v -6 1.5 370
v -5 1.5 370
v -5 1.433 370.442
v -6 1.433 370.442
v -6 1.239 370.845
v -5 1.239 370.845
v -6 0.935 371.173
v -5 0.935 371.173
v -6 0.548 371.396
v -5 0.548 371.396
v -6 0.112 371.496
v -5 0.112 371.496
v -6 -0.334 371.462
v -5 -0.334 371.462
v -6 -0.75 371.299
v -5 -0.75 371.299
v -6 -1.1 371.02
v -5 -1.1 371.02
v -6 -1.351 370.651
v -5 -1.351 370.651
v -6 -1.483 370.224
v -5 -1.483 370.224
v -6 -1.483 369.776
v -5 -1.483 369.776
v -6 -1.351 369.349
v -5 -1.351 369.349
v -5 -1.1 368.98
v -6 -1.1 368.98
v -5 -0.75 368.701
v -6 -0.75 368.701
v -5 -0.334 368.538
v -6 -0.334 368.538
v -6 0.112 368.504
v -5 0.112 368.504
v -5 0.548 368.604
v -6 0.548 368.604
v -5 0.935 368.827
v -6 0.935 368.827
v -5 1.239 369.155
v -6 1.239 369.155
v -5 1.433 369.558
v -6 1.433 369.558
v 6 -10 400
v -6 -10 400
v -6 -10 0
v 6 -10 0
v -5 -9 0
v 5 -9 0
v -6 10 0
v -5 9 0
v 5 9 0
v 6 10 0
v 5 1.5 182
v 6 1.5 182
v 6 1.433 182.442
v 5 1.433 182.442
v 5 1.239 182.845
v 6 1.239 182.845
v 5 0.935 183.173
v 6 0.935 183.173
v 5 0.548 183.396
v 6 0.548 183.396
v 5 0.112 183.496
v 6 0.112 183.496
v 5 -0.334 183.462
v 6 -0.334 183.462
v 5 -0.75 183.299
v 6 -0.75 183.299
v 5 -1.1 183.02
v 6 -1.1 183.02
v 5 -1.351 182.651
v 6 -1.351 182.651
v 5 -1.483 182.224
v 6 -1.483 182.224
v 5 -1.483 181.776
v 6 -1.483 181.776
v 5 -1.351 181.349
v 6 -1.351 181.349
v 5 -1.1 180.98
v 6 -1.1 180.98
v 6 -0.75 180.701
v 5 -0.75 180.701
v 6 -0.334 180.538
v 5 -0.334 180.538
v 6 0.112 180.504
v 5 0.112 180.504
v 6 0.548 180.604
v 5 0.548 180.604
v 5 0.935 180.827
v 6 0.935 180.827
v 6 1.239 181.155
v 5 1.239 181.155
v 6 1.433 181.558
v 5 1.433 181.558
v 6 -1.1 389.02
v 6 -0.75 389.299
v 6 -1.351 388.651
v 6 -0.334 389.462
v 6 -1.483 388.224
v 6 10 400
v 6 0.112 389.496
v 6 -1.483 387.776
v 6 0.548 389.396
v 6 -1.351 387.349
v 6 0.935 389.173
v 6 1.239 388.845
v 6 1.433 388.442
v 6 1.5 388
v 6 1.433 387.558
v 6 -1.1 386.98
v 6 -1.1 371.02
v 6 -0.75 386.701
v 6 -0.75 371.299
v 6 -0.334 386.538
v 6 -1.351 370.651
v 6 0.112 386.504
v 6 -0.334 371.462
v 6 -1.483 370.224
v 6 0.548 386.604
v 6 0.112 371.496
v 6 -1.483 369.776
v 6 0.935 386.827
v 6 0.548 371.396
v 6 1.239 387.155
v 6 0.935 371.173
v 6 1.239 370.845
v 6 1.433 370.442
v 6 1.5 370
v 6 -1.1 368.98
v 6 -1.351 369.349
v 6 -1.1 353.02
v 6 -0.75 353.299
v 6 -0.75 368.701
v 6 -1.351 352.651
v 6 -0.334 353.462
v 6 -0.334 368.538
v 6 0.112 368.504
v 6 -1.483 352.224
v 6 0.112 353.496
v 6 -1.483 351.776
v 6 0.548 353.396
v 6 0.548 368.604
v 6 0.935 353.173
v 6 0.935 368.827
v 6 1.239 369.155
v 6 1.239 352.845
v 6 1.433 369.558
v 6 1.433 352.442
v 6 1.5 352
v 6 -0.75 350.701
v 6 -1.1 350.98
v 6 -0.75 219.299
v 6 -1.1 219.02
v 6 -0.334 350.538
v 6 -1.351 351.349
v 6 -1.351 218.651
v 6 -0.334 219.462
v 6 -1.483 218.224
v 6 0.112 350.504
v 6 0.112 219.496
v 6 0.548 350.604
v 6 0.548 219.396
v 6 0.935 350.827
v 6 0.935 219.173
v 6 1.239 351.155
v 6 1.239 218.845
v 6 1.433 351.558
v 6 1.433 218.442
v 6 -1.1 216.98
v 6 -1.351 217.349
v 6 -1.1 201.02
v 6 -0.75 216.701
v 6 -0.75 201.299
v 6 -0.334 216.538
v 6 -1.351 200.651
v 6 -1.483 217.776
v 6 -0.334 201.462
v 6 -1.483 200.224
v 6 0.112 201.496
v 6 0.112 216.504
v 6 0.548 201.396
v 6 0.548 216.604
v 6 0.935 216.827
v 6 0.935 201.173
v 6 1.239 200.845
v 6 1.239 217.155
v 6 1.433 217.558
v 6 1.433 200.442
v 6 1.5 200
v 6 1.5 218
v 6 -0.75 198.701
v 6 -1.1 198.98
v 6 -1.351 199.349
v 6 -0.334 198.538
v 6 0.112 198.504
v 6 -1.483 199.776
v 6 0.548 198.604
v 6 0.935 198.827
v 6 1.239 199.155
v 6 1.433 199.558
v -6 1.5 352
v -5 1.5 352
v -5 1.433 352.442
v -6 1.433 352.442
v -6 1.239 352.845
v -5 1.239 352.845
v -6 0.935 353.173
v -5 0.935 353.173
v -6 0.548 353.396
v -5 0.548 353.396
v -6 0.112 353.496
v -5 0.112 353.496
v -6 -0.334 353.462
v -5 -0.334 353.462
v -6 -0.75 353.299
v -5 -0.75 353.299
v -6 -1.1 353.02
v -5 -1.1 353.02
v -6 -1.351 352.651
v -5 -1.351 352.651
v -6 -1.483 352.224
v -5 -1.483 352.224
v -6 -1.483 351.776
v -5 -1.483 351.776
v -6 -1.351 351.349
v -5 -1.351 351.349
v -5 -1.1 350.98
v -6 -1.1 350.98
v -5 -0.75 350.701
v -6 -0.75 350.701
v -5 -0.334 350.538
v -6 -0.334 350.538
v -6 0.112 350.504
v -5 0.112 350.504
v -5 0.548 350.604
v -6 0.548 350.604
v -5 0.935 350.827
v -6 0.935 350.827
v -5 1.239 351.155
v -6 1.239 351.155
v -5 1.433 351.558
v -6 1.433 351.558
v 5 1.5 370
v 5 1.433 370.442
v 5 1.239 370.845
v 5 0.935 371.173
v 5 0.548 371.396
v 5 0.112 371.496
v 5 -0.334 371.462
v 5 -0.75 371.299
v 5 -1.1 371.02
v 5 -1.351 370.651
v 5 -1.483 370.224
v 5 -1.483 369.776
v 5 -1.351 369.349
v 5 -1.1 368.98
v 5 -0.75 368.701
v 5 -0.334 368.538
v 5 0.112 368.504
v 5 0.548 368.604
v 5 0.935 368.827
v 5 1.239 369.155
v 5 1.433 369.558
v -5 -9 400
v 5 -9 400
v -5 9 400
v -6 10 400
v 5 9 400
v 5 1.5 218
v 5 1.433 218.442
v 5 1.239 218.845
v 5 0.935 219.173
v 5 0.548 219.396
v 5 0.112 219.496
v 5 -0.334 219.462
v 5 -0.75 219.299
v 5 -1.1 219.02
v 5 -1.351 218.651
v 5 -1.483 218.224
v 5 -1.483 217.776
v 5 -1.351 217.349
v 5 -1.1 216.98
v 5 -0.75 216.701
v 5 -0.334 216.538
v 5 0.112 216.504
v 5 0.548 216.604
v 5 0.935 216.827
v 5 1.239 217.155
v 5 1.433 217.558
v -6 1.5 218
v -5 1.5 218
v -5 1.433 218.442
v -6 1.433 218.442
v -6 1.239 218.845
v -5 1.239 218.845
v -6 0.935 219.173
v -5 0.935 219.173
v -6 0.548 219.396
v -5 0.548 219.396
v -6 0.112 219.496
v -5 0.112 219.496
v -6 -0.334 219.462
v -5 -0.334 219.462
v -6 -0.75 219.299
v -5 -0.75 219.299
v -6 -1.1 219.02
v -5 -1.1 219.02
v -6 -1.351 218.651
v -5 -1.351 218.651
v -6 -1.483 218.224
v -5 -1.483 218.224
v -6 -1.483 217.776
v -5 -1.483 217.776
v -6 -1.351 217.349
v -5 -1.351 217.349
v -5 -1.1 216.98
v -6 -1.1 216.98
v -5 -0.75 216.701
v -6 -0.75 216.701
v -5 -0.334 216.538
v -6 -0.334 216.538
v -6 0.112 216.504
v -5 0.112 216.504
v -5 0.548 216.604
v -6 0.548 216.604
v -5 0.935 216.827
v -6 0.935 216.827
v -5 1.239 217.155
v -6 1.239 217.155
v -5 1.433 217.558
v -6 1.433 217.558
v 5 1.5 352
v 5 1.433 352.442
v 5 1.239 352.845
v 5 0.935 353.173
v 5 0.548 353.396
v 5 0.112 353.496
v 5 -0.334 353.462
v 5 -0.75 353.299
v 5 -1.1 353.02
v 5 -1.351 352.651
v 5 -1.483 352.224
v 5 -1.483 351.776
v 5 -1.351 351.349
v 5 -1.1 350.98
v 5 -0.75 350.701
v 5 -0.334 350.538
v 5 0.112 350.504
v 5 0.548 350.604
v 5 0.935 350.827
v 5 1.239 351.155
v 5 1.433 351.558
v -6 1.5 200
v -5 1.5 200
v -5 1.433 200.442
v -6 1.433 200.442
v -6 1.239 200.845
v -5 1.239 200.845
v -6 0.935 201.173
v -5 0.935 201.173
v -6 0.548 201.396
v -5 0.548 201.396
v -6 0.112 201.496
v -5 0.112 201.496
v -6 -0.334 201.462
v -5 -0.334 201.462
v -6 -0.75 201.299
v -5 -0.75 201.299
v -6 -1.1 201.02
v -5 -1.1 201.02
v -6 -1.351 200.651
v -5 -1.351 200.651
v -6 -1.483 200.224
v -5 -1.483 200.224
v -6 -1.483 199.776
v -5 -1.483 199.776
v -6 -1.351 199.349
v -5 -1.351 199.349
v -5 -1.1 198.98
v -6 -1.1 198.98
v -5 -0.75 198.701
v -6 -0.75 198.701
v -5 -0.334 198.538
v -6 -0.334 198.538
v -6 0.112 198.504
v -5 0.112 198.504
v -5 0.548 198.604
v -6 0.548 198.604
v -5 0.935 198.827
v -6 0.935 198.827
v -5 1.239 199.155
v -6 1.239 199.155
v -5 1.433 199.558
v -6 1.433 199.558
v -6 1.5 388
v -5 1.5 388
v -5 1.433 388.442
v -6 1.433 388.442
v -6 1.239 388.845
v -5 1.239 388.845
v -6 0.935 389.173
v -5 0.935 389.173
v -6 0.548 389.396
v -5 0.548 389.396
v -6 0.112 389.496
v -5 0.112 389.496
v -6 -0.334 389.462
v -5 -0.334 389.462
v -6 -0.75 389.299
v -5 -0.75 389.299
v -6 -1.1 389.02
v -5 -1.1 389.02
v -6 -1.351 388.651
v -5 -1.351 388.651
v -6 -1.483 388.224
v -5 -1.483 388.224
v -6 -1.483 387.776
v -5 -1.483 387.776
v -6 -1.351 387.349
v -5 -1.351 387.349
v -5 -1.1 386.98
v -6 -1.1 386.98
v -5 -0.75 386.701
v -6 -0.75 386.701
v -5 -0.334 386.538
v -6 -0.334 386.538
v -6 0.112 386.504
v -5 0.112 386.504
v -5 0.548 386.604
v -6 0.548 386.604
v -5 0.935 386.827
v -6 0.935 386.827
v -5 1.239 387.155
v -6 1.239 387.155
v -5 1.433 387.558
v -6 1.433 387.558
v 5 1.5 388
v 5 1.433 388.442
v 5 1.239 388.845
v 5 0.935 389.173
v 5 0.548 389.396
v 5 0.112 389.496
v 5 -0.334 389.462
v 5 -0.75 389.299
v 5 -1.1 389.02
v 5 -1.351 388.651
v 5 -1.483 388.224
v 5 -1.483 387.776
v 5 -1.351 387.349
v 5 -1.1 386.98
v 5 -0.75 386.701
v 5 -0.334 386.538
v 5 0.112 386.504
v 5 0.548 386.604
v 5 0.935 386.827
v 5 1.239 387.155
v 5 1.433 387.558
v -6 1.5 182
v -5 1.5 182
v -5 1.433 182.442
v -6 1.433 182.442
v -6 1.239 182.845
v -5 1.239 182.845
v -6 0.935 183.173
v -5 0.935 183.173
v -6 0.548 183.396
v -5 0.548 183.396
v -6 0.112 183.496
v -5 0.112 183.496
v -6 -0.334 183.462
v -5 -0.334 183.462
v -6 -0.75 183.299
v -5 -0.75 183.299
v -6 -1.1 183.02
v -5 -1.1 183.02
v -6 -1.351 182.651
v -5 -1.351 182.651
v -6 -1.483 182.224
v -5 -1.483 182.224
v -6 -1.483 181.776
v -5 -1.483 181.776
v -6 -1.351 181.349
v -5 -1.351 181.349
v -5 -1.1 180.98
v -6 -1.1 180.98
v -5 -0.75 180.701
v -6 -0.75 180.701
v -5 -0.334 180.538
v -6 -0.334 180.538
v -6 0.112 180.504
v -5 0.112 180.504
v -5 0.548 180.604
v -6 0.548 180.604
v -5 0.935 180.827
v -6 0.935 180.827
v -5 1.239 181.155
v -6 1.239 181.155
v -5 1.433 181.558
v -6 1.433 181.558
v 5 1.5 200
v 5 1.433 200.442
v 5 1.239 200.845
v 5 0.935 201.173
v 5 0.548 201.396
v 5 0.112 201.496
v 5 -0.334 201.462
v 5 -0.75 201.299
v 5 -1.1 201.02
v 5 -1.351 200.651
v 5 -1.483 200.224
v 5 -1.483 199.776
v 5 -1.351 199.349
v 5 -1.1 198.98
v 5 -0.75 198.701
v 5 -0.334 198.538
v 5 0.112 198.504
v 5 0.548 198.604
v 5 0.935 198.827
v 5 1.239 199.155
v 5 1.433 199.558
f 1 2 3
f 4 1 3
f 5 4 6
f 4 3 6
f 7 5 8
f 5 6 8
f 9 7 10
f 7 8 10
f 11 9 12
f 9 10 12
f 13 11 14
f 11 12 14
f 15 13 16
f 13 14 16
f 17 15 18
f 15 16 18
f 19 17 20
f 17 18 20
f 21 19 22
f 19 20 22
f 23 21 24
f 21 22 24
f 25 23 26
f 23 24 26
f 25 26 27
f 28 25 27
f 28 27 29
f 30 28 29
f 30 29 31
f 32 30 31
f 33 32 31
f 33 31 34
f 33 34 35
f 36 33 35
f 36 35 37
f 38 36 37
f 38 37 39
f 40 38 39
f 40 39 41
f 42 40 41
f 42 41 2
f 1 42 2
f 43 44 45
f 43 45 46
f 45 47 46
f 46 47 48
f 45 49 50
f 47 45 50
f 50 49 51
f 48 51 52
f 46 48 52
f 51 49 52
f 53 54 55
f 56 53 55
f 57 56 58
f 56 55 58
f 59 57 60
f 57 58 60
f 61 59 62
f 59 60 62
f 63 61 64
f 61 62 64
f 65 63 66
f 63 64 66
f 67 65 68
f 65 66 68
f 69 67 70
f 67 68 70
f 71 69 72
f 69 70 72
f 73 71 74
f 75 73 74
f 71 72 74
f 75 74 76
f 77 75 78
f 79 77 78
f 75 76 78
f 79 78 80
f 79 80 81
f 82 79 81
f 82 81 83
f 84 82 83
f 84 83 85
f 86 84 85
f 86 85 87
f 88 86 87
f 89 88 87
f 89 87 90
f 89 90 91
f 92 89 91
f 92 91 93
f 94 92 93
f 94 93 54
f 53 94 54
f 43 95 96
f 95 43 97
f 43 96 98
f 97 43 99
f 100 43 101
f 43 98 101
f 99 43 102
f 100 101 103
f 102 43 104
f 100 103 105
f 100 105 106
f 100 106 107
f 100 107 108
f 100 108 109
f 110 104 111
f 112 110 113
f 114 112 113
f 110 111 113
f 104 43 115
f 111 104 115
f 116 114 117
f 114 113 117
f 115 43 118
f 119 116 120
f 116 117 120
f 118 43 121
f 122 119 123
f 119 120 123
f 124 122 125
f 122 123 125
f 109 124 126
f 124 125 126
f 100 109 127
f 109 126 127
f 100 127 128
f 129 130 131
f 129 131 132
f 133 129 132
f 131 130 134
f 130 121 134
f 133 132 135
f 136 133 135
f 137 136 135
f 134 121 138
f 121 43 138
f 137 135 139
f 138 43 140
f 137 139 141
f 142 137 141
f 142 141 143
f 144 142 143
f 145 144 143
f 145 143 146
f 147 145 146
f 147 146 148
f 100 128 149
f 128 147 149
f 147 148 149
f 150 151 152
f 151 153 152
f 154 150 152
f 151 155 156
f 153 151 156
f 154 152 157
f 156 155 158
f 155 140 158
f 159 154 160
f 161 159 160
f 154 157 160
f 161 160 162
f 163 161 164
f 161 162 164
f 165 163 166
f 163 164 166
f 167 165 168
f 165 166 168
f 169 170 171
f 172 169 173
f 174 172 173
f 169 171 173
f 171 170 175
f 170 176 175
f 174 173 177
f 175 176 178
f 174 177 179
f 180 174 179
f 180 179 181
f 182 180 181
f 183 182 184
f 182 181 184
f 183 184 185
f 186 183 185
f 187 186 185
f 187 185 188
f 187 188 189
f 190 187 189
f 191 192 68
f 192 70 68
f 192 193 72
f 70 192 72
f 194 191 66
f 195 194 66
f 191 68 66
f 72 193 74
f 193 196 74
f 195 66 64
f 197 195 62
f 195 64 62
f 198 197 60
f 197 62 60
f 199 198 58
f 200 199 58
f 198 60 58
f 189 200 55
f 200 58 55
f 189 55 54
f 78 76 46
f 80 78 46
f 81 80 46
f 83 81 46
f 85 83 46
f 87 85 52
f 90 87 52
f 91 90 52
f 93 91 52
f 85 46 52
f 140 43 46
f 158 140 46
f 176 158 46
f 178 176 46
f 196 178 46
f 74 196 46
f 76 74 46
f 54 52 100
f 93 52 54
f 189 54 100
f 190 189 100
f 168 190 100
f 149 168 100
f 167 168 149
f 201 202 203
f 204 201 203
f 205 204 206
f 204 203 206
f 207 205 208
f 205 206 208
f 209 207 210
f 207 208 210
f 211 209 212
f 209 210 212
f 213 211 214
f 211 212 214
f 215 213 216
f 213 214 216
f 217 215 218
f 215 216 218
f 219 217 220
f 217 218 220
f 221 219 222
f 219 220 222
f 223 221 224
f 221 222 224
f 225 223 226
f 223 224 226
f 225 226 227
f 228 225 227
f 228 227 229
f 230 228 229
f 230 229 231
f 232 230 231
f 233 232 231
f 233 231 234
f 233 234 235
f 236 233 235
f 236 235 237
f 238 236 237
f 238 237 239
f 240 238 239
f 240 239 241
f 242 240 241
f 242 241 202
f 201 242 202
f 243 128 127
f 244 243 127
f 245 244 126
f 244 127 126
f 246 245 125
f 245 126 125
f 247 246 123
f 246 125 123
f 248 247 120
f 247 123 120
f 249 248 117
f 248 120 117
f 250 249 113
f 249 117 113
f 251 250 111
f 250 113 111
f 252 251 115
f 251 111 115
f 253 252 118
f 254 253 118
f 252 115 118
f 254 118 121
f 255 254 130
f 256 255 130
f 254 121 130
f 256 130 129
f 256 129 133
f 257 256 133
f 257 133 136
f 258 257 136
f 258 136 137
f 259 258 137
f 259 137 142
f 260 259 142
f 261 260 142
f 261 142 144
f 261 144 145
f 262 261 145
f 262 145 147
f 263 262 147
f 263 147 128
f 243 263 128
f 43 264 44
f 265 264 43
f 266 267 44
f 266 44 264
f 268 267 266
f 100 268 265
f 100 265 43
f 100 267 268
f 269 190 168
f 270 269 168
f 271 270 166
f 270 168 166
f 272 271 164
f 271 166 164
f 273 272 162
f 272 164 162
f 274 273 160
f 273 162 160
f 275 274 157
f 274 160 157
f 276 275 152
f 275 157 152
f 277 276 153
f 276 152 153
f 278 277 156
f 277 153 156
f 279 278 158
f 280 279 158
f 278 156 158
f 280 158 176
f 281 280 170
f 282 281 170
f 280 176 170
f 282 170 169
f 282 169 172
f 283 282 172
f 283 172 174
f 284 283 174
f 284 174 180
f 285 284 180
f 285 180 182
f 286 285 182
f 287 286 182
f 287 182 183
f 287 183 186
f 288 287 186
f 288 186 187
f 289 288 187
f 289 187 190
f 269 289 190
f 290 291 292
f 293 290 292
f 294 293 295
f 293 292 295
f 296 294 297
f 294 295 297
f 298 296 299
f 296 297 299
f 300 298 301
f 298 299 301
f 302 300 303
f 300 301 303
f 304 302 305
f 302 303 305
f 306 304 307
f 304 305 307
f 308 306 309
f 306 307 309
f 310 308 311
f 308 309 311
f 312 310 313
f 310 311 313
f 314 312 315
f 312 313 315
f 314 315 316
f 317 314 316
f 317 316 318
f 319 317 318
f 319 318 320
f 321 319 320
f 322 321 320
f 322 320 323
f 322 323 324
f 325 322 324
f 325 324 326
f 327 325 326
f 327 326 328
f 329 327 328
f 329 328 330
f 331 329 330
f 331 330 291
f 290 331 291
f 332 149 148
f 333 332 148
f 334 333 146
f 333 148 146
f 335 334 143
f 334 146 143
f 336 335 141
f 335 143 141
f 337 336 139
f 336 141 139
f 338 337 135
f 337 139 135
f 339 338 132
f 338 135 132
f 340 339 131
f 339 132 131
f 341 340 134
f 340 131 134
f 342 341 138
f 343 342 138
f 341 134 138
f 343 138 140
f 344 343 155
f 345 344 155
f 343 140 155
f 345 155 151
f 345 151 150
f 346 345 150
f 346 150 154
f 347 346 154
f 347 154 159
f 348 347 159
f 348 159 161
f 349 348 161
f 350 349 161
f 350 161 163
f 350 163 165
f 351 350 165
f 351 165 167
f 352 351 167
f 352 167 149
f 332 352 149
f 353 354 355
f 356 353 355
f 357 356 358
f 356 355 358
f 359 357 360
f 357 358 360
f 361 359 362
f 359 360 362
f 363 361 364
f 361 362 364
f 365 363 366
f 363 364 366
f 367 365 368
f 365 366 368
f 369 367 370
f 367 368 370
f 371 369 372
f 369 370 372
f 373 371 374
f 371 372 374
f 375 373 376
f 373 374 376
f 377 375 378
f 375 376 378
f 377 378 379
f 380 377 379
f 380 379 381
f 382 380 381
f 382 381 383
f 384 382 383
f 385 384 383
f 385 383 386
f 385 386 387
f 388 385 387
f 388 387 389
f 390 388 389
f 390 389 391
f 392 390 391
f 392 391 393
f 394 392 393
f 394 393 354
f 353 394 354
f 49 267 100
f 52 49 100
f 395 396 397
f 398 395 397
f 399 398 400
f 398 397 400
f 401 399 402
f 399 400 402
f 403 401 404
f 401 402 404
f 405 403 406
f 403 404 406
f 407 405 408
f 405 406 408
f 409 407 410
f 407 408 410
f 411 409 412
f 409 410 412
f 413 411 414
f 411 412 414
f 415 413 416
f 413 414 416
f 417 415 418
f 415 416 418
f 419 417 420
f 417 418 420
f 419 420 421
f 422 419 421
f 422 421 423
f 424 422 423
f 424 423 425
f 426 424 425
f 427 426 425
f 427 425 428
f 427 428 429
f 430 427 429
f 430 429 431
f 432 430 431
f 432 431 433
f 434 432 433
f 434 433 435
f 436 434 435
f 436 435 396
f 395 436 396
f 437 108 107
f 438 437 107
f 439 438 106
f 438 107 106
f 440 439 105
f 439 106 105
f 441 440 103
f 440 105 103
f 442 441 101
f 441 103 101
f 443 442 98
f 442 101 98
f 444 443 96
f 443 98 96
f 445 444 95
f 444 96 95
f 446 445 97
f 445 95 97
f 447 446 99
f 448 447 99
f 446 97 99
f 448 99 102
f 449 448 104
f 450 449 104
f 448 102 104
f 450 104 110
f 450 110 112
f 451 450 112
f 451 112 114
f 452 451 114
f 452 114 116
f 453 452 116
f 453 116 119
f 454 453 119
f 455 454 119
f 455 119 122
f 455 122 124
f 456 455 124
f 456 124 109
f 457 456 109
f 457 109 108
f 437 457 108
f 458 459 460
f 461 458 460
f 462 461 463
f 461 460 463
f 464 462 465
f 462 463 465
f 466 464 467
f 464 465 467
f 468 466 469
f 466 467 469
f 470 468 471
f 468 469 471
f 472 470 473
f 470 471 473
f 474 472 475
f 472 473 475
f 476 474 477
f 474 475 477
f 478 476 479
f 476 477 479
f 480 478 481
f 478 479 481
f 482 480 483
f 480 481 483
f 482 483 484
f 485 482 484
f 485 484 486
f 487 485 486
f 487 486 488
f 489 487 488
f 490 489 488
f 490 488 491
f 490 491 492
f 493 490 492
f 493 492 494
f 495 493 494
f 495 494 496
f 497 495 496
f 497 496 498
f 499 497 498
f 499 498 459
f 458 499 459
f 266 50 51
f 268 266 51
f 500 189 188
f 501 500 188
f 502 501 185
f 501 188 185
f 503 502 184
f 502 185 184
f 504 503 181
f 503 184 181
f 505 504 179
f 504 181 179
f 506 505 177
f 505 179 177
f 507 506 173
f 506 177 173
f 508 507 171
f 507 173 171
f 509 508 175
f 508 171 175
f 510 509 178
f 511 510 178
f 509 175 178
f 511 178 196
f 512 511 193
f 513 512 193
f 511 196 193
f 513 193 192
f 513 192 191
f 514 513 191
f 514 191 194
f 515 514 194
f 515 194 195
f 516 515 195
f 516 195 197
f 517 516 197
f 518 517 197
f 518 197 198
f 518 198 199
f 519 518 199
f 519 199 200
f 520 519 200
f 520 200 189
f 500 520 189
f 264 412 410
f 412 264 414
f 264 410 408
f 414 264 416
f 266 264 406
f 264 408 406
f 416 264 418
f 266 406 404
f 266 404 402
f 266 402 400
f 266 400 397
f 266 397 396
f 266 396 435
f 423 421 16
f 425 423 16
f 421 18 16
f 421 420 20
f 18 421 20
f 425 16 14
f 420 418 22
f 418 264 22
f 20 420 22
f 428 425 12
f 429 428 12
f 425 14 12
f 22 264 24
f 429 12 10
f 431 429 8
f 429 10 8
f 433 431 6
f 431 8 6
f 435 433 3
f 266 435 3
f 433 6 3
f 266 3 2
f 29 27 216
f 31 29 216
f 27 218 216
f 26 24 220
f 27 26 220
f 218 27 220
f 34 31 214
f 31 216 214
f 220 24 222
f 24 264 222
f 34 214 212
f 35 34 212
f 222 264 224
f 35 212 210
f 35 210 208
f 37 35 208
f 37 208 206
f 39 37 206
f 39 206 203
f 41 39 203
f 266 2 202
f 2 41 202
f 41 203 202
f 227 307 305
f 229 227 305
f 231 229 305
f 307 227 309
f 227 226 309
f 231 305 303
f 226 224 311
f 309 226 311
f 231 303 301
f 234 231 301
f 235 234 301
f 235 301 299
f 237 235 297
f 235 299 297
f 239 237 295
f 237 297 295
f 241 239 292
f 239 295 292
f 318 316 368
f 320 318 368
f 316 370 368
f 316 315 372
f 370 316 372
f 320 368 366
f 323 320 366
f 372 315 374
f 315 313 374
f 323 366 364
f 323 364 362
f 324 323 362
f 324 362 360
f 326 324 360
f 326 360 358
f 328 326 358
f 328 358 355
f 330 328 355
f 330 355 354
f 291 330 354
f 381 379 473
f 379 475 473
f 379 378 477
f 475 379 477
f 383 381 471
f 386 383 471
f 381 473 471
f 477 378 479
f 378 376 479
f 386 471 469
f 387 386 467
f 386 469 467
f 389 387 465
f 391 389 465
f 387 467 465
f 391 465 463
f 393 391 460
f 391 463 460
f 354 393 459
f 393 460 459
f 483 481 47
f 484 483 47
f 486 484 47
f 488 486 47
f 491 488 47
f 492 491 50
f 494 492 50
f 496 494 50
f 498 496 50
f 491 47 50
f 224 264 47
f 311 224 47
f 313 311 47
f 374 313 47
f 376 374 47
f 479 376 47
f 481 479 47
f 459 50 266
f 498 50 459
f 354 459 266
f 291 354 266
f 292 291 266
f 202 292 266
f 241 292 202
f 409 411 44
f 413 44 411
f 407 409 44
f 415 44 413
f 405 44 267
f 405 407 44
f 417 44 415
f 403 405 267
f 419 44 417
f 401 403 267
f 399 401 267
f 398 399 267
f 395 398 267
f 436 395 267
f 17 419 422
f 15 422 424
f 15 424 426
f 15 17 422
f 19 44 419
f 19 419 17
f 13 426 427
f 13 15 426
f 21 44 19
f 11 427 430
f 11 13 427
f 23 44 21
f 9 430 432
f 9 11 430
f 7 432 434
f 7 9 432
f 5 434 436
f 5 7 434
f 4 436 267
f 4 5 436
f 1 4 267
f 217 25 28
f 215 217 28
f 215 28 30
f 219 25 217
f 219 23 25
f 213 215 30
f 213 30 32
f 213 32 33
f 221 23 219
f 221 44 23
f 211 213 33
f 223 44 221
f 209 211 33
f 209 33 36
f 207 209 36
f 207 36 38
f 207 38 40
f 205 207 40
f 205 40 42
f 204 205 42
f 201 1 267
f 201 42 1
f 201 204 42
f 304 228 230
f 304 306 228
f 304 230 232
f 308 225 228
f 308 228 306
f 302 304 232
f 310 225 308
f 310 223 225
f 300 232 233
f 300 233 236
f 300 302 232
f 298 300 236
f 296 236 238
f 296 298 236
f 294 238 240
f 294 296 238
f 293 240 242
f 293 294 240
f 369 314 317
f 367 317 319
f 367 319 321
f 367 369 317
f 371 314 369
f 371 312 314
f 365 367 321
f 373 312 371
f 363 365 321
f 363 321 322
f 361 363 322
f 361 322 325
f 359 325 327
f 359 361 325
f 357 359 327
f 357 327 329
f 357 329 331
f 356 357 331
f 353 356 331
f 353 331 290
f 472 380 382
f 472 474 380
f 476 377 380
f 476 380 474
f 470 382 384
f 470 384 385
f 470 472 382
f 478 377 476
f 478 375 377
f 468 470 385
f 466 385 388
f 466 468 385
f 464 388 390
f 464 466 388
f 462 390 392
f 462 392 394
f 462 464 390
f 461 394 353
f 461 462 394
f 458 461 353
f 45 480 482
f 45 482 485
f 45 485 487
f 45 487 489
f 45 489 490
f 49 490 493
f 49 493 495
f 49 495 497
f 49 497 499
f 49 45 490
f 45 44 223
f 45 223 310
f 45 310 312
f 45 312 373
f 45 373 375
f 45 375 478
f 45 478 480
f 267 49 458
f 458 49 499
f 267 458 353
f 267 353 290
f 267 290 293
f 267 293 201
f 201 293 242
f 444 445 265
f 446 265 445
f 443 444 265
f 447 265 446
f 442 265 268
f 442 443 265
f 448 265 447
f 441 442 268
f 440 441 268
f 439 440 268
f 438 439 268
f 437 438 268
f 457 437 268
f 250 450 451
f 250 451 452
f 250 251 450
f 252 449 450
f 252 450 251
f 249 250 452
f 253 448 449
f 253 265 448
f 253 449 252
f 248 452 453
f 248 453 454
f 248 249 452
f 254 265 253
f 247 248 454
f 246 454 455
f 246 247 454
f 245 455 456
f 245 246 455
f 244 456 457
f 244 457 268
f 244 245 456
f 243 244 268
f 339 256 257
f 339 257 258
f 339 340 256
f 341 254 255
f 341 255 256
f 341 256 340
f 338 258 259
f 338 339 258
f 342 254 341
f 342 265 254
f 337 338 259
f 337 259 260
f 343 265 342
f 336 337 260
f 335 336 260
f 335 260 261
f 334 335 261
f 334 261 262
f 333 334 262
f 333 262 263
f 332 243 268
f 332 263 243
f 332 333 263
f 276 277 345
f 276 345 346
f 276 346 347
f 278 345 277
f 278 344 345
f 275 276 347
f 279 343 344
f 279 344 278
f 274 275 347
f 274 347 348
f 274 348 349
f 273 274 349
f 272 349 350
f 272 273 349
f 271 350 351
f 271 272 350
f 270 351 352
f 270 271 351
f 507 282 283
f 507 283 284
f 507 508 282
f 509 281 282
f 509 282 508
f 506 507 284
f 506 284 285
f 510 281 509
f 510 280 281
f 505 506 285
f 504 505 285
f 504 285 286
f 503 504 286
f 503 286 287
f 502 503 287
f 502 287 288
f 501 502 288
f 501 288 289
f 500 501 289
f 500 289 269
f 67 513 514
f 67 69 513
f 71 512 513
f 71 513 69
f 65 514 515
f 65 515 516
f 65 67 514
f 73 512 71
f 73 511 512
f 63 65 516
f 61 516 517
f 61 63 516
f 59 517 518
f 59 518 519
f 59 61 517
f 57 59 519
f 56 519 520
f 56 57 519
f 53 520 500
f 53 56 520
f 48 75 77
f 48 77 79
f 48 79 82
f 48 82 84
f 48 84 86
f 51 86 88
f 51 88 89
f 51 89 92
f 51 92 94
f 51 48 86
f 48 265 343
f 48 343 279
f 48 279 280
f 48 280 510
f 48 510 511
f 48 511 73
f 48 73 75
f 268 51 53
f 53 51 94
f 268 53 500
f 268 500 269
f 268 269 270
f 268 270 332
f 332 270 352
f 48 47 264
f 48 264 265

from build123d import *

# Parameters (mm, degrees)
SKETCH1_W           = 12
SKETCH1_H           = 20
SKETCH1_W_2         = 10
SKETCH1_H_2         = 18
BOSS_EXTRUDE1_DEPTH = 400
SKETCH2_R           = 1.5
CUT_EXTRUDE1_DEPTH  = 200


with BuildPart() as part:
    # Sketch1 → Boss-Extrude1 (new body)
    with BuildSketch(Plane.XY):
        Rectangle(SKETCH1_W, SKETCH1_H)
        Rectangle(SKETCH1_W_2, SKETCH1_H_2, mode=Mode.SUBTRACT)
    extrude(amount=BOSS_EXTRUDE1_DEPTH)

    # Sketch2 → Cut-Extrude1 (cut)
    with BuildSketch(Plane(origin=(6, 0, 0), x_dir=(0, 0, -1), z_dir=(1, 0, 0))):
        with Locations(Location((-200, 0, 0), (0, 0, 90))):
            Circle(SKETCH2_R)
        with Locations(Location((-182, 0, 0), (0, 0, 90))):
            Circle(SKETCH2_R)
        with Locations(Location((-218, 0, 0), (0, 0, 90))):
            Circle(SKETCH2_R)
        with Locations(Location((-370, 0, 0), (0, 0, 90))):
            Circle(SKETCH2_R)
        with Locations(Location((-388, 0, 0), (0, 0, 90))):
            Circle(SKETCH2_R)
        with Locations(Location((-352, 0, 0), (0, 0, 90))):
            Circle(SKETCH2_R)
    extrude(amount=-CUT_EXTRUDE1_DEPTH, mode=Mode.SUBTRACT)


solid = part.part
